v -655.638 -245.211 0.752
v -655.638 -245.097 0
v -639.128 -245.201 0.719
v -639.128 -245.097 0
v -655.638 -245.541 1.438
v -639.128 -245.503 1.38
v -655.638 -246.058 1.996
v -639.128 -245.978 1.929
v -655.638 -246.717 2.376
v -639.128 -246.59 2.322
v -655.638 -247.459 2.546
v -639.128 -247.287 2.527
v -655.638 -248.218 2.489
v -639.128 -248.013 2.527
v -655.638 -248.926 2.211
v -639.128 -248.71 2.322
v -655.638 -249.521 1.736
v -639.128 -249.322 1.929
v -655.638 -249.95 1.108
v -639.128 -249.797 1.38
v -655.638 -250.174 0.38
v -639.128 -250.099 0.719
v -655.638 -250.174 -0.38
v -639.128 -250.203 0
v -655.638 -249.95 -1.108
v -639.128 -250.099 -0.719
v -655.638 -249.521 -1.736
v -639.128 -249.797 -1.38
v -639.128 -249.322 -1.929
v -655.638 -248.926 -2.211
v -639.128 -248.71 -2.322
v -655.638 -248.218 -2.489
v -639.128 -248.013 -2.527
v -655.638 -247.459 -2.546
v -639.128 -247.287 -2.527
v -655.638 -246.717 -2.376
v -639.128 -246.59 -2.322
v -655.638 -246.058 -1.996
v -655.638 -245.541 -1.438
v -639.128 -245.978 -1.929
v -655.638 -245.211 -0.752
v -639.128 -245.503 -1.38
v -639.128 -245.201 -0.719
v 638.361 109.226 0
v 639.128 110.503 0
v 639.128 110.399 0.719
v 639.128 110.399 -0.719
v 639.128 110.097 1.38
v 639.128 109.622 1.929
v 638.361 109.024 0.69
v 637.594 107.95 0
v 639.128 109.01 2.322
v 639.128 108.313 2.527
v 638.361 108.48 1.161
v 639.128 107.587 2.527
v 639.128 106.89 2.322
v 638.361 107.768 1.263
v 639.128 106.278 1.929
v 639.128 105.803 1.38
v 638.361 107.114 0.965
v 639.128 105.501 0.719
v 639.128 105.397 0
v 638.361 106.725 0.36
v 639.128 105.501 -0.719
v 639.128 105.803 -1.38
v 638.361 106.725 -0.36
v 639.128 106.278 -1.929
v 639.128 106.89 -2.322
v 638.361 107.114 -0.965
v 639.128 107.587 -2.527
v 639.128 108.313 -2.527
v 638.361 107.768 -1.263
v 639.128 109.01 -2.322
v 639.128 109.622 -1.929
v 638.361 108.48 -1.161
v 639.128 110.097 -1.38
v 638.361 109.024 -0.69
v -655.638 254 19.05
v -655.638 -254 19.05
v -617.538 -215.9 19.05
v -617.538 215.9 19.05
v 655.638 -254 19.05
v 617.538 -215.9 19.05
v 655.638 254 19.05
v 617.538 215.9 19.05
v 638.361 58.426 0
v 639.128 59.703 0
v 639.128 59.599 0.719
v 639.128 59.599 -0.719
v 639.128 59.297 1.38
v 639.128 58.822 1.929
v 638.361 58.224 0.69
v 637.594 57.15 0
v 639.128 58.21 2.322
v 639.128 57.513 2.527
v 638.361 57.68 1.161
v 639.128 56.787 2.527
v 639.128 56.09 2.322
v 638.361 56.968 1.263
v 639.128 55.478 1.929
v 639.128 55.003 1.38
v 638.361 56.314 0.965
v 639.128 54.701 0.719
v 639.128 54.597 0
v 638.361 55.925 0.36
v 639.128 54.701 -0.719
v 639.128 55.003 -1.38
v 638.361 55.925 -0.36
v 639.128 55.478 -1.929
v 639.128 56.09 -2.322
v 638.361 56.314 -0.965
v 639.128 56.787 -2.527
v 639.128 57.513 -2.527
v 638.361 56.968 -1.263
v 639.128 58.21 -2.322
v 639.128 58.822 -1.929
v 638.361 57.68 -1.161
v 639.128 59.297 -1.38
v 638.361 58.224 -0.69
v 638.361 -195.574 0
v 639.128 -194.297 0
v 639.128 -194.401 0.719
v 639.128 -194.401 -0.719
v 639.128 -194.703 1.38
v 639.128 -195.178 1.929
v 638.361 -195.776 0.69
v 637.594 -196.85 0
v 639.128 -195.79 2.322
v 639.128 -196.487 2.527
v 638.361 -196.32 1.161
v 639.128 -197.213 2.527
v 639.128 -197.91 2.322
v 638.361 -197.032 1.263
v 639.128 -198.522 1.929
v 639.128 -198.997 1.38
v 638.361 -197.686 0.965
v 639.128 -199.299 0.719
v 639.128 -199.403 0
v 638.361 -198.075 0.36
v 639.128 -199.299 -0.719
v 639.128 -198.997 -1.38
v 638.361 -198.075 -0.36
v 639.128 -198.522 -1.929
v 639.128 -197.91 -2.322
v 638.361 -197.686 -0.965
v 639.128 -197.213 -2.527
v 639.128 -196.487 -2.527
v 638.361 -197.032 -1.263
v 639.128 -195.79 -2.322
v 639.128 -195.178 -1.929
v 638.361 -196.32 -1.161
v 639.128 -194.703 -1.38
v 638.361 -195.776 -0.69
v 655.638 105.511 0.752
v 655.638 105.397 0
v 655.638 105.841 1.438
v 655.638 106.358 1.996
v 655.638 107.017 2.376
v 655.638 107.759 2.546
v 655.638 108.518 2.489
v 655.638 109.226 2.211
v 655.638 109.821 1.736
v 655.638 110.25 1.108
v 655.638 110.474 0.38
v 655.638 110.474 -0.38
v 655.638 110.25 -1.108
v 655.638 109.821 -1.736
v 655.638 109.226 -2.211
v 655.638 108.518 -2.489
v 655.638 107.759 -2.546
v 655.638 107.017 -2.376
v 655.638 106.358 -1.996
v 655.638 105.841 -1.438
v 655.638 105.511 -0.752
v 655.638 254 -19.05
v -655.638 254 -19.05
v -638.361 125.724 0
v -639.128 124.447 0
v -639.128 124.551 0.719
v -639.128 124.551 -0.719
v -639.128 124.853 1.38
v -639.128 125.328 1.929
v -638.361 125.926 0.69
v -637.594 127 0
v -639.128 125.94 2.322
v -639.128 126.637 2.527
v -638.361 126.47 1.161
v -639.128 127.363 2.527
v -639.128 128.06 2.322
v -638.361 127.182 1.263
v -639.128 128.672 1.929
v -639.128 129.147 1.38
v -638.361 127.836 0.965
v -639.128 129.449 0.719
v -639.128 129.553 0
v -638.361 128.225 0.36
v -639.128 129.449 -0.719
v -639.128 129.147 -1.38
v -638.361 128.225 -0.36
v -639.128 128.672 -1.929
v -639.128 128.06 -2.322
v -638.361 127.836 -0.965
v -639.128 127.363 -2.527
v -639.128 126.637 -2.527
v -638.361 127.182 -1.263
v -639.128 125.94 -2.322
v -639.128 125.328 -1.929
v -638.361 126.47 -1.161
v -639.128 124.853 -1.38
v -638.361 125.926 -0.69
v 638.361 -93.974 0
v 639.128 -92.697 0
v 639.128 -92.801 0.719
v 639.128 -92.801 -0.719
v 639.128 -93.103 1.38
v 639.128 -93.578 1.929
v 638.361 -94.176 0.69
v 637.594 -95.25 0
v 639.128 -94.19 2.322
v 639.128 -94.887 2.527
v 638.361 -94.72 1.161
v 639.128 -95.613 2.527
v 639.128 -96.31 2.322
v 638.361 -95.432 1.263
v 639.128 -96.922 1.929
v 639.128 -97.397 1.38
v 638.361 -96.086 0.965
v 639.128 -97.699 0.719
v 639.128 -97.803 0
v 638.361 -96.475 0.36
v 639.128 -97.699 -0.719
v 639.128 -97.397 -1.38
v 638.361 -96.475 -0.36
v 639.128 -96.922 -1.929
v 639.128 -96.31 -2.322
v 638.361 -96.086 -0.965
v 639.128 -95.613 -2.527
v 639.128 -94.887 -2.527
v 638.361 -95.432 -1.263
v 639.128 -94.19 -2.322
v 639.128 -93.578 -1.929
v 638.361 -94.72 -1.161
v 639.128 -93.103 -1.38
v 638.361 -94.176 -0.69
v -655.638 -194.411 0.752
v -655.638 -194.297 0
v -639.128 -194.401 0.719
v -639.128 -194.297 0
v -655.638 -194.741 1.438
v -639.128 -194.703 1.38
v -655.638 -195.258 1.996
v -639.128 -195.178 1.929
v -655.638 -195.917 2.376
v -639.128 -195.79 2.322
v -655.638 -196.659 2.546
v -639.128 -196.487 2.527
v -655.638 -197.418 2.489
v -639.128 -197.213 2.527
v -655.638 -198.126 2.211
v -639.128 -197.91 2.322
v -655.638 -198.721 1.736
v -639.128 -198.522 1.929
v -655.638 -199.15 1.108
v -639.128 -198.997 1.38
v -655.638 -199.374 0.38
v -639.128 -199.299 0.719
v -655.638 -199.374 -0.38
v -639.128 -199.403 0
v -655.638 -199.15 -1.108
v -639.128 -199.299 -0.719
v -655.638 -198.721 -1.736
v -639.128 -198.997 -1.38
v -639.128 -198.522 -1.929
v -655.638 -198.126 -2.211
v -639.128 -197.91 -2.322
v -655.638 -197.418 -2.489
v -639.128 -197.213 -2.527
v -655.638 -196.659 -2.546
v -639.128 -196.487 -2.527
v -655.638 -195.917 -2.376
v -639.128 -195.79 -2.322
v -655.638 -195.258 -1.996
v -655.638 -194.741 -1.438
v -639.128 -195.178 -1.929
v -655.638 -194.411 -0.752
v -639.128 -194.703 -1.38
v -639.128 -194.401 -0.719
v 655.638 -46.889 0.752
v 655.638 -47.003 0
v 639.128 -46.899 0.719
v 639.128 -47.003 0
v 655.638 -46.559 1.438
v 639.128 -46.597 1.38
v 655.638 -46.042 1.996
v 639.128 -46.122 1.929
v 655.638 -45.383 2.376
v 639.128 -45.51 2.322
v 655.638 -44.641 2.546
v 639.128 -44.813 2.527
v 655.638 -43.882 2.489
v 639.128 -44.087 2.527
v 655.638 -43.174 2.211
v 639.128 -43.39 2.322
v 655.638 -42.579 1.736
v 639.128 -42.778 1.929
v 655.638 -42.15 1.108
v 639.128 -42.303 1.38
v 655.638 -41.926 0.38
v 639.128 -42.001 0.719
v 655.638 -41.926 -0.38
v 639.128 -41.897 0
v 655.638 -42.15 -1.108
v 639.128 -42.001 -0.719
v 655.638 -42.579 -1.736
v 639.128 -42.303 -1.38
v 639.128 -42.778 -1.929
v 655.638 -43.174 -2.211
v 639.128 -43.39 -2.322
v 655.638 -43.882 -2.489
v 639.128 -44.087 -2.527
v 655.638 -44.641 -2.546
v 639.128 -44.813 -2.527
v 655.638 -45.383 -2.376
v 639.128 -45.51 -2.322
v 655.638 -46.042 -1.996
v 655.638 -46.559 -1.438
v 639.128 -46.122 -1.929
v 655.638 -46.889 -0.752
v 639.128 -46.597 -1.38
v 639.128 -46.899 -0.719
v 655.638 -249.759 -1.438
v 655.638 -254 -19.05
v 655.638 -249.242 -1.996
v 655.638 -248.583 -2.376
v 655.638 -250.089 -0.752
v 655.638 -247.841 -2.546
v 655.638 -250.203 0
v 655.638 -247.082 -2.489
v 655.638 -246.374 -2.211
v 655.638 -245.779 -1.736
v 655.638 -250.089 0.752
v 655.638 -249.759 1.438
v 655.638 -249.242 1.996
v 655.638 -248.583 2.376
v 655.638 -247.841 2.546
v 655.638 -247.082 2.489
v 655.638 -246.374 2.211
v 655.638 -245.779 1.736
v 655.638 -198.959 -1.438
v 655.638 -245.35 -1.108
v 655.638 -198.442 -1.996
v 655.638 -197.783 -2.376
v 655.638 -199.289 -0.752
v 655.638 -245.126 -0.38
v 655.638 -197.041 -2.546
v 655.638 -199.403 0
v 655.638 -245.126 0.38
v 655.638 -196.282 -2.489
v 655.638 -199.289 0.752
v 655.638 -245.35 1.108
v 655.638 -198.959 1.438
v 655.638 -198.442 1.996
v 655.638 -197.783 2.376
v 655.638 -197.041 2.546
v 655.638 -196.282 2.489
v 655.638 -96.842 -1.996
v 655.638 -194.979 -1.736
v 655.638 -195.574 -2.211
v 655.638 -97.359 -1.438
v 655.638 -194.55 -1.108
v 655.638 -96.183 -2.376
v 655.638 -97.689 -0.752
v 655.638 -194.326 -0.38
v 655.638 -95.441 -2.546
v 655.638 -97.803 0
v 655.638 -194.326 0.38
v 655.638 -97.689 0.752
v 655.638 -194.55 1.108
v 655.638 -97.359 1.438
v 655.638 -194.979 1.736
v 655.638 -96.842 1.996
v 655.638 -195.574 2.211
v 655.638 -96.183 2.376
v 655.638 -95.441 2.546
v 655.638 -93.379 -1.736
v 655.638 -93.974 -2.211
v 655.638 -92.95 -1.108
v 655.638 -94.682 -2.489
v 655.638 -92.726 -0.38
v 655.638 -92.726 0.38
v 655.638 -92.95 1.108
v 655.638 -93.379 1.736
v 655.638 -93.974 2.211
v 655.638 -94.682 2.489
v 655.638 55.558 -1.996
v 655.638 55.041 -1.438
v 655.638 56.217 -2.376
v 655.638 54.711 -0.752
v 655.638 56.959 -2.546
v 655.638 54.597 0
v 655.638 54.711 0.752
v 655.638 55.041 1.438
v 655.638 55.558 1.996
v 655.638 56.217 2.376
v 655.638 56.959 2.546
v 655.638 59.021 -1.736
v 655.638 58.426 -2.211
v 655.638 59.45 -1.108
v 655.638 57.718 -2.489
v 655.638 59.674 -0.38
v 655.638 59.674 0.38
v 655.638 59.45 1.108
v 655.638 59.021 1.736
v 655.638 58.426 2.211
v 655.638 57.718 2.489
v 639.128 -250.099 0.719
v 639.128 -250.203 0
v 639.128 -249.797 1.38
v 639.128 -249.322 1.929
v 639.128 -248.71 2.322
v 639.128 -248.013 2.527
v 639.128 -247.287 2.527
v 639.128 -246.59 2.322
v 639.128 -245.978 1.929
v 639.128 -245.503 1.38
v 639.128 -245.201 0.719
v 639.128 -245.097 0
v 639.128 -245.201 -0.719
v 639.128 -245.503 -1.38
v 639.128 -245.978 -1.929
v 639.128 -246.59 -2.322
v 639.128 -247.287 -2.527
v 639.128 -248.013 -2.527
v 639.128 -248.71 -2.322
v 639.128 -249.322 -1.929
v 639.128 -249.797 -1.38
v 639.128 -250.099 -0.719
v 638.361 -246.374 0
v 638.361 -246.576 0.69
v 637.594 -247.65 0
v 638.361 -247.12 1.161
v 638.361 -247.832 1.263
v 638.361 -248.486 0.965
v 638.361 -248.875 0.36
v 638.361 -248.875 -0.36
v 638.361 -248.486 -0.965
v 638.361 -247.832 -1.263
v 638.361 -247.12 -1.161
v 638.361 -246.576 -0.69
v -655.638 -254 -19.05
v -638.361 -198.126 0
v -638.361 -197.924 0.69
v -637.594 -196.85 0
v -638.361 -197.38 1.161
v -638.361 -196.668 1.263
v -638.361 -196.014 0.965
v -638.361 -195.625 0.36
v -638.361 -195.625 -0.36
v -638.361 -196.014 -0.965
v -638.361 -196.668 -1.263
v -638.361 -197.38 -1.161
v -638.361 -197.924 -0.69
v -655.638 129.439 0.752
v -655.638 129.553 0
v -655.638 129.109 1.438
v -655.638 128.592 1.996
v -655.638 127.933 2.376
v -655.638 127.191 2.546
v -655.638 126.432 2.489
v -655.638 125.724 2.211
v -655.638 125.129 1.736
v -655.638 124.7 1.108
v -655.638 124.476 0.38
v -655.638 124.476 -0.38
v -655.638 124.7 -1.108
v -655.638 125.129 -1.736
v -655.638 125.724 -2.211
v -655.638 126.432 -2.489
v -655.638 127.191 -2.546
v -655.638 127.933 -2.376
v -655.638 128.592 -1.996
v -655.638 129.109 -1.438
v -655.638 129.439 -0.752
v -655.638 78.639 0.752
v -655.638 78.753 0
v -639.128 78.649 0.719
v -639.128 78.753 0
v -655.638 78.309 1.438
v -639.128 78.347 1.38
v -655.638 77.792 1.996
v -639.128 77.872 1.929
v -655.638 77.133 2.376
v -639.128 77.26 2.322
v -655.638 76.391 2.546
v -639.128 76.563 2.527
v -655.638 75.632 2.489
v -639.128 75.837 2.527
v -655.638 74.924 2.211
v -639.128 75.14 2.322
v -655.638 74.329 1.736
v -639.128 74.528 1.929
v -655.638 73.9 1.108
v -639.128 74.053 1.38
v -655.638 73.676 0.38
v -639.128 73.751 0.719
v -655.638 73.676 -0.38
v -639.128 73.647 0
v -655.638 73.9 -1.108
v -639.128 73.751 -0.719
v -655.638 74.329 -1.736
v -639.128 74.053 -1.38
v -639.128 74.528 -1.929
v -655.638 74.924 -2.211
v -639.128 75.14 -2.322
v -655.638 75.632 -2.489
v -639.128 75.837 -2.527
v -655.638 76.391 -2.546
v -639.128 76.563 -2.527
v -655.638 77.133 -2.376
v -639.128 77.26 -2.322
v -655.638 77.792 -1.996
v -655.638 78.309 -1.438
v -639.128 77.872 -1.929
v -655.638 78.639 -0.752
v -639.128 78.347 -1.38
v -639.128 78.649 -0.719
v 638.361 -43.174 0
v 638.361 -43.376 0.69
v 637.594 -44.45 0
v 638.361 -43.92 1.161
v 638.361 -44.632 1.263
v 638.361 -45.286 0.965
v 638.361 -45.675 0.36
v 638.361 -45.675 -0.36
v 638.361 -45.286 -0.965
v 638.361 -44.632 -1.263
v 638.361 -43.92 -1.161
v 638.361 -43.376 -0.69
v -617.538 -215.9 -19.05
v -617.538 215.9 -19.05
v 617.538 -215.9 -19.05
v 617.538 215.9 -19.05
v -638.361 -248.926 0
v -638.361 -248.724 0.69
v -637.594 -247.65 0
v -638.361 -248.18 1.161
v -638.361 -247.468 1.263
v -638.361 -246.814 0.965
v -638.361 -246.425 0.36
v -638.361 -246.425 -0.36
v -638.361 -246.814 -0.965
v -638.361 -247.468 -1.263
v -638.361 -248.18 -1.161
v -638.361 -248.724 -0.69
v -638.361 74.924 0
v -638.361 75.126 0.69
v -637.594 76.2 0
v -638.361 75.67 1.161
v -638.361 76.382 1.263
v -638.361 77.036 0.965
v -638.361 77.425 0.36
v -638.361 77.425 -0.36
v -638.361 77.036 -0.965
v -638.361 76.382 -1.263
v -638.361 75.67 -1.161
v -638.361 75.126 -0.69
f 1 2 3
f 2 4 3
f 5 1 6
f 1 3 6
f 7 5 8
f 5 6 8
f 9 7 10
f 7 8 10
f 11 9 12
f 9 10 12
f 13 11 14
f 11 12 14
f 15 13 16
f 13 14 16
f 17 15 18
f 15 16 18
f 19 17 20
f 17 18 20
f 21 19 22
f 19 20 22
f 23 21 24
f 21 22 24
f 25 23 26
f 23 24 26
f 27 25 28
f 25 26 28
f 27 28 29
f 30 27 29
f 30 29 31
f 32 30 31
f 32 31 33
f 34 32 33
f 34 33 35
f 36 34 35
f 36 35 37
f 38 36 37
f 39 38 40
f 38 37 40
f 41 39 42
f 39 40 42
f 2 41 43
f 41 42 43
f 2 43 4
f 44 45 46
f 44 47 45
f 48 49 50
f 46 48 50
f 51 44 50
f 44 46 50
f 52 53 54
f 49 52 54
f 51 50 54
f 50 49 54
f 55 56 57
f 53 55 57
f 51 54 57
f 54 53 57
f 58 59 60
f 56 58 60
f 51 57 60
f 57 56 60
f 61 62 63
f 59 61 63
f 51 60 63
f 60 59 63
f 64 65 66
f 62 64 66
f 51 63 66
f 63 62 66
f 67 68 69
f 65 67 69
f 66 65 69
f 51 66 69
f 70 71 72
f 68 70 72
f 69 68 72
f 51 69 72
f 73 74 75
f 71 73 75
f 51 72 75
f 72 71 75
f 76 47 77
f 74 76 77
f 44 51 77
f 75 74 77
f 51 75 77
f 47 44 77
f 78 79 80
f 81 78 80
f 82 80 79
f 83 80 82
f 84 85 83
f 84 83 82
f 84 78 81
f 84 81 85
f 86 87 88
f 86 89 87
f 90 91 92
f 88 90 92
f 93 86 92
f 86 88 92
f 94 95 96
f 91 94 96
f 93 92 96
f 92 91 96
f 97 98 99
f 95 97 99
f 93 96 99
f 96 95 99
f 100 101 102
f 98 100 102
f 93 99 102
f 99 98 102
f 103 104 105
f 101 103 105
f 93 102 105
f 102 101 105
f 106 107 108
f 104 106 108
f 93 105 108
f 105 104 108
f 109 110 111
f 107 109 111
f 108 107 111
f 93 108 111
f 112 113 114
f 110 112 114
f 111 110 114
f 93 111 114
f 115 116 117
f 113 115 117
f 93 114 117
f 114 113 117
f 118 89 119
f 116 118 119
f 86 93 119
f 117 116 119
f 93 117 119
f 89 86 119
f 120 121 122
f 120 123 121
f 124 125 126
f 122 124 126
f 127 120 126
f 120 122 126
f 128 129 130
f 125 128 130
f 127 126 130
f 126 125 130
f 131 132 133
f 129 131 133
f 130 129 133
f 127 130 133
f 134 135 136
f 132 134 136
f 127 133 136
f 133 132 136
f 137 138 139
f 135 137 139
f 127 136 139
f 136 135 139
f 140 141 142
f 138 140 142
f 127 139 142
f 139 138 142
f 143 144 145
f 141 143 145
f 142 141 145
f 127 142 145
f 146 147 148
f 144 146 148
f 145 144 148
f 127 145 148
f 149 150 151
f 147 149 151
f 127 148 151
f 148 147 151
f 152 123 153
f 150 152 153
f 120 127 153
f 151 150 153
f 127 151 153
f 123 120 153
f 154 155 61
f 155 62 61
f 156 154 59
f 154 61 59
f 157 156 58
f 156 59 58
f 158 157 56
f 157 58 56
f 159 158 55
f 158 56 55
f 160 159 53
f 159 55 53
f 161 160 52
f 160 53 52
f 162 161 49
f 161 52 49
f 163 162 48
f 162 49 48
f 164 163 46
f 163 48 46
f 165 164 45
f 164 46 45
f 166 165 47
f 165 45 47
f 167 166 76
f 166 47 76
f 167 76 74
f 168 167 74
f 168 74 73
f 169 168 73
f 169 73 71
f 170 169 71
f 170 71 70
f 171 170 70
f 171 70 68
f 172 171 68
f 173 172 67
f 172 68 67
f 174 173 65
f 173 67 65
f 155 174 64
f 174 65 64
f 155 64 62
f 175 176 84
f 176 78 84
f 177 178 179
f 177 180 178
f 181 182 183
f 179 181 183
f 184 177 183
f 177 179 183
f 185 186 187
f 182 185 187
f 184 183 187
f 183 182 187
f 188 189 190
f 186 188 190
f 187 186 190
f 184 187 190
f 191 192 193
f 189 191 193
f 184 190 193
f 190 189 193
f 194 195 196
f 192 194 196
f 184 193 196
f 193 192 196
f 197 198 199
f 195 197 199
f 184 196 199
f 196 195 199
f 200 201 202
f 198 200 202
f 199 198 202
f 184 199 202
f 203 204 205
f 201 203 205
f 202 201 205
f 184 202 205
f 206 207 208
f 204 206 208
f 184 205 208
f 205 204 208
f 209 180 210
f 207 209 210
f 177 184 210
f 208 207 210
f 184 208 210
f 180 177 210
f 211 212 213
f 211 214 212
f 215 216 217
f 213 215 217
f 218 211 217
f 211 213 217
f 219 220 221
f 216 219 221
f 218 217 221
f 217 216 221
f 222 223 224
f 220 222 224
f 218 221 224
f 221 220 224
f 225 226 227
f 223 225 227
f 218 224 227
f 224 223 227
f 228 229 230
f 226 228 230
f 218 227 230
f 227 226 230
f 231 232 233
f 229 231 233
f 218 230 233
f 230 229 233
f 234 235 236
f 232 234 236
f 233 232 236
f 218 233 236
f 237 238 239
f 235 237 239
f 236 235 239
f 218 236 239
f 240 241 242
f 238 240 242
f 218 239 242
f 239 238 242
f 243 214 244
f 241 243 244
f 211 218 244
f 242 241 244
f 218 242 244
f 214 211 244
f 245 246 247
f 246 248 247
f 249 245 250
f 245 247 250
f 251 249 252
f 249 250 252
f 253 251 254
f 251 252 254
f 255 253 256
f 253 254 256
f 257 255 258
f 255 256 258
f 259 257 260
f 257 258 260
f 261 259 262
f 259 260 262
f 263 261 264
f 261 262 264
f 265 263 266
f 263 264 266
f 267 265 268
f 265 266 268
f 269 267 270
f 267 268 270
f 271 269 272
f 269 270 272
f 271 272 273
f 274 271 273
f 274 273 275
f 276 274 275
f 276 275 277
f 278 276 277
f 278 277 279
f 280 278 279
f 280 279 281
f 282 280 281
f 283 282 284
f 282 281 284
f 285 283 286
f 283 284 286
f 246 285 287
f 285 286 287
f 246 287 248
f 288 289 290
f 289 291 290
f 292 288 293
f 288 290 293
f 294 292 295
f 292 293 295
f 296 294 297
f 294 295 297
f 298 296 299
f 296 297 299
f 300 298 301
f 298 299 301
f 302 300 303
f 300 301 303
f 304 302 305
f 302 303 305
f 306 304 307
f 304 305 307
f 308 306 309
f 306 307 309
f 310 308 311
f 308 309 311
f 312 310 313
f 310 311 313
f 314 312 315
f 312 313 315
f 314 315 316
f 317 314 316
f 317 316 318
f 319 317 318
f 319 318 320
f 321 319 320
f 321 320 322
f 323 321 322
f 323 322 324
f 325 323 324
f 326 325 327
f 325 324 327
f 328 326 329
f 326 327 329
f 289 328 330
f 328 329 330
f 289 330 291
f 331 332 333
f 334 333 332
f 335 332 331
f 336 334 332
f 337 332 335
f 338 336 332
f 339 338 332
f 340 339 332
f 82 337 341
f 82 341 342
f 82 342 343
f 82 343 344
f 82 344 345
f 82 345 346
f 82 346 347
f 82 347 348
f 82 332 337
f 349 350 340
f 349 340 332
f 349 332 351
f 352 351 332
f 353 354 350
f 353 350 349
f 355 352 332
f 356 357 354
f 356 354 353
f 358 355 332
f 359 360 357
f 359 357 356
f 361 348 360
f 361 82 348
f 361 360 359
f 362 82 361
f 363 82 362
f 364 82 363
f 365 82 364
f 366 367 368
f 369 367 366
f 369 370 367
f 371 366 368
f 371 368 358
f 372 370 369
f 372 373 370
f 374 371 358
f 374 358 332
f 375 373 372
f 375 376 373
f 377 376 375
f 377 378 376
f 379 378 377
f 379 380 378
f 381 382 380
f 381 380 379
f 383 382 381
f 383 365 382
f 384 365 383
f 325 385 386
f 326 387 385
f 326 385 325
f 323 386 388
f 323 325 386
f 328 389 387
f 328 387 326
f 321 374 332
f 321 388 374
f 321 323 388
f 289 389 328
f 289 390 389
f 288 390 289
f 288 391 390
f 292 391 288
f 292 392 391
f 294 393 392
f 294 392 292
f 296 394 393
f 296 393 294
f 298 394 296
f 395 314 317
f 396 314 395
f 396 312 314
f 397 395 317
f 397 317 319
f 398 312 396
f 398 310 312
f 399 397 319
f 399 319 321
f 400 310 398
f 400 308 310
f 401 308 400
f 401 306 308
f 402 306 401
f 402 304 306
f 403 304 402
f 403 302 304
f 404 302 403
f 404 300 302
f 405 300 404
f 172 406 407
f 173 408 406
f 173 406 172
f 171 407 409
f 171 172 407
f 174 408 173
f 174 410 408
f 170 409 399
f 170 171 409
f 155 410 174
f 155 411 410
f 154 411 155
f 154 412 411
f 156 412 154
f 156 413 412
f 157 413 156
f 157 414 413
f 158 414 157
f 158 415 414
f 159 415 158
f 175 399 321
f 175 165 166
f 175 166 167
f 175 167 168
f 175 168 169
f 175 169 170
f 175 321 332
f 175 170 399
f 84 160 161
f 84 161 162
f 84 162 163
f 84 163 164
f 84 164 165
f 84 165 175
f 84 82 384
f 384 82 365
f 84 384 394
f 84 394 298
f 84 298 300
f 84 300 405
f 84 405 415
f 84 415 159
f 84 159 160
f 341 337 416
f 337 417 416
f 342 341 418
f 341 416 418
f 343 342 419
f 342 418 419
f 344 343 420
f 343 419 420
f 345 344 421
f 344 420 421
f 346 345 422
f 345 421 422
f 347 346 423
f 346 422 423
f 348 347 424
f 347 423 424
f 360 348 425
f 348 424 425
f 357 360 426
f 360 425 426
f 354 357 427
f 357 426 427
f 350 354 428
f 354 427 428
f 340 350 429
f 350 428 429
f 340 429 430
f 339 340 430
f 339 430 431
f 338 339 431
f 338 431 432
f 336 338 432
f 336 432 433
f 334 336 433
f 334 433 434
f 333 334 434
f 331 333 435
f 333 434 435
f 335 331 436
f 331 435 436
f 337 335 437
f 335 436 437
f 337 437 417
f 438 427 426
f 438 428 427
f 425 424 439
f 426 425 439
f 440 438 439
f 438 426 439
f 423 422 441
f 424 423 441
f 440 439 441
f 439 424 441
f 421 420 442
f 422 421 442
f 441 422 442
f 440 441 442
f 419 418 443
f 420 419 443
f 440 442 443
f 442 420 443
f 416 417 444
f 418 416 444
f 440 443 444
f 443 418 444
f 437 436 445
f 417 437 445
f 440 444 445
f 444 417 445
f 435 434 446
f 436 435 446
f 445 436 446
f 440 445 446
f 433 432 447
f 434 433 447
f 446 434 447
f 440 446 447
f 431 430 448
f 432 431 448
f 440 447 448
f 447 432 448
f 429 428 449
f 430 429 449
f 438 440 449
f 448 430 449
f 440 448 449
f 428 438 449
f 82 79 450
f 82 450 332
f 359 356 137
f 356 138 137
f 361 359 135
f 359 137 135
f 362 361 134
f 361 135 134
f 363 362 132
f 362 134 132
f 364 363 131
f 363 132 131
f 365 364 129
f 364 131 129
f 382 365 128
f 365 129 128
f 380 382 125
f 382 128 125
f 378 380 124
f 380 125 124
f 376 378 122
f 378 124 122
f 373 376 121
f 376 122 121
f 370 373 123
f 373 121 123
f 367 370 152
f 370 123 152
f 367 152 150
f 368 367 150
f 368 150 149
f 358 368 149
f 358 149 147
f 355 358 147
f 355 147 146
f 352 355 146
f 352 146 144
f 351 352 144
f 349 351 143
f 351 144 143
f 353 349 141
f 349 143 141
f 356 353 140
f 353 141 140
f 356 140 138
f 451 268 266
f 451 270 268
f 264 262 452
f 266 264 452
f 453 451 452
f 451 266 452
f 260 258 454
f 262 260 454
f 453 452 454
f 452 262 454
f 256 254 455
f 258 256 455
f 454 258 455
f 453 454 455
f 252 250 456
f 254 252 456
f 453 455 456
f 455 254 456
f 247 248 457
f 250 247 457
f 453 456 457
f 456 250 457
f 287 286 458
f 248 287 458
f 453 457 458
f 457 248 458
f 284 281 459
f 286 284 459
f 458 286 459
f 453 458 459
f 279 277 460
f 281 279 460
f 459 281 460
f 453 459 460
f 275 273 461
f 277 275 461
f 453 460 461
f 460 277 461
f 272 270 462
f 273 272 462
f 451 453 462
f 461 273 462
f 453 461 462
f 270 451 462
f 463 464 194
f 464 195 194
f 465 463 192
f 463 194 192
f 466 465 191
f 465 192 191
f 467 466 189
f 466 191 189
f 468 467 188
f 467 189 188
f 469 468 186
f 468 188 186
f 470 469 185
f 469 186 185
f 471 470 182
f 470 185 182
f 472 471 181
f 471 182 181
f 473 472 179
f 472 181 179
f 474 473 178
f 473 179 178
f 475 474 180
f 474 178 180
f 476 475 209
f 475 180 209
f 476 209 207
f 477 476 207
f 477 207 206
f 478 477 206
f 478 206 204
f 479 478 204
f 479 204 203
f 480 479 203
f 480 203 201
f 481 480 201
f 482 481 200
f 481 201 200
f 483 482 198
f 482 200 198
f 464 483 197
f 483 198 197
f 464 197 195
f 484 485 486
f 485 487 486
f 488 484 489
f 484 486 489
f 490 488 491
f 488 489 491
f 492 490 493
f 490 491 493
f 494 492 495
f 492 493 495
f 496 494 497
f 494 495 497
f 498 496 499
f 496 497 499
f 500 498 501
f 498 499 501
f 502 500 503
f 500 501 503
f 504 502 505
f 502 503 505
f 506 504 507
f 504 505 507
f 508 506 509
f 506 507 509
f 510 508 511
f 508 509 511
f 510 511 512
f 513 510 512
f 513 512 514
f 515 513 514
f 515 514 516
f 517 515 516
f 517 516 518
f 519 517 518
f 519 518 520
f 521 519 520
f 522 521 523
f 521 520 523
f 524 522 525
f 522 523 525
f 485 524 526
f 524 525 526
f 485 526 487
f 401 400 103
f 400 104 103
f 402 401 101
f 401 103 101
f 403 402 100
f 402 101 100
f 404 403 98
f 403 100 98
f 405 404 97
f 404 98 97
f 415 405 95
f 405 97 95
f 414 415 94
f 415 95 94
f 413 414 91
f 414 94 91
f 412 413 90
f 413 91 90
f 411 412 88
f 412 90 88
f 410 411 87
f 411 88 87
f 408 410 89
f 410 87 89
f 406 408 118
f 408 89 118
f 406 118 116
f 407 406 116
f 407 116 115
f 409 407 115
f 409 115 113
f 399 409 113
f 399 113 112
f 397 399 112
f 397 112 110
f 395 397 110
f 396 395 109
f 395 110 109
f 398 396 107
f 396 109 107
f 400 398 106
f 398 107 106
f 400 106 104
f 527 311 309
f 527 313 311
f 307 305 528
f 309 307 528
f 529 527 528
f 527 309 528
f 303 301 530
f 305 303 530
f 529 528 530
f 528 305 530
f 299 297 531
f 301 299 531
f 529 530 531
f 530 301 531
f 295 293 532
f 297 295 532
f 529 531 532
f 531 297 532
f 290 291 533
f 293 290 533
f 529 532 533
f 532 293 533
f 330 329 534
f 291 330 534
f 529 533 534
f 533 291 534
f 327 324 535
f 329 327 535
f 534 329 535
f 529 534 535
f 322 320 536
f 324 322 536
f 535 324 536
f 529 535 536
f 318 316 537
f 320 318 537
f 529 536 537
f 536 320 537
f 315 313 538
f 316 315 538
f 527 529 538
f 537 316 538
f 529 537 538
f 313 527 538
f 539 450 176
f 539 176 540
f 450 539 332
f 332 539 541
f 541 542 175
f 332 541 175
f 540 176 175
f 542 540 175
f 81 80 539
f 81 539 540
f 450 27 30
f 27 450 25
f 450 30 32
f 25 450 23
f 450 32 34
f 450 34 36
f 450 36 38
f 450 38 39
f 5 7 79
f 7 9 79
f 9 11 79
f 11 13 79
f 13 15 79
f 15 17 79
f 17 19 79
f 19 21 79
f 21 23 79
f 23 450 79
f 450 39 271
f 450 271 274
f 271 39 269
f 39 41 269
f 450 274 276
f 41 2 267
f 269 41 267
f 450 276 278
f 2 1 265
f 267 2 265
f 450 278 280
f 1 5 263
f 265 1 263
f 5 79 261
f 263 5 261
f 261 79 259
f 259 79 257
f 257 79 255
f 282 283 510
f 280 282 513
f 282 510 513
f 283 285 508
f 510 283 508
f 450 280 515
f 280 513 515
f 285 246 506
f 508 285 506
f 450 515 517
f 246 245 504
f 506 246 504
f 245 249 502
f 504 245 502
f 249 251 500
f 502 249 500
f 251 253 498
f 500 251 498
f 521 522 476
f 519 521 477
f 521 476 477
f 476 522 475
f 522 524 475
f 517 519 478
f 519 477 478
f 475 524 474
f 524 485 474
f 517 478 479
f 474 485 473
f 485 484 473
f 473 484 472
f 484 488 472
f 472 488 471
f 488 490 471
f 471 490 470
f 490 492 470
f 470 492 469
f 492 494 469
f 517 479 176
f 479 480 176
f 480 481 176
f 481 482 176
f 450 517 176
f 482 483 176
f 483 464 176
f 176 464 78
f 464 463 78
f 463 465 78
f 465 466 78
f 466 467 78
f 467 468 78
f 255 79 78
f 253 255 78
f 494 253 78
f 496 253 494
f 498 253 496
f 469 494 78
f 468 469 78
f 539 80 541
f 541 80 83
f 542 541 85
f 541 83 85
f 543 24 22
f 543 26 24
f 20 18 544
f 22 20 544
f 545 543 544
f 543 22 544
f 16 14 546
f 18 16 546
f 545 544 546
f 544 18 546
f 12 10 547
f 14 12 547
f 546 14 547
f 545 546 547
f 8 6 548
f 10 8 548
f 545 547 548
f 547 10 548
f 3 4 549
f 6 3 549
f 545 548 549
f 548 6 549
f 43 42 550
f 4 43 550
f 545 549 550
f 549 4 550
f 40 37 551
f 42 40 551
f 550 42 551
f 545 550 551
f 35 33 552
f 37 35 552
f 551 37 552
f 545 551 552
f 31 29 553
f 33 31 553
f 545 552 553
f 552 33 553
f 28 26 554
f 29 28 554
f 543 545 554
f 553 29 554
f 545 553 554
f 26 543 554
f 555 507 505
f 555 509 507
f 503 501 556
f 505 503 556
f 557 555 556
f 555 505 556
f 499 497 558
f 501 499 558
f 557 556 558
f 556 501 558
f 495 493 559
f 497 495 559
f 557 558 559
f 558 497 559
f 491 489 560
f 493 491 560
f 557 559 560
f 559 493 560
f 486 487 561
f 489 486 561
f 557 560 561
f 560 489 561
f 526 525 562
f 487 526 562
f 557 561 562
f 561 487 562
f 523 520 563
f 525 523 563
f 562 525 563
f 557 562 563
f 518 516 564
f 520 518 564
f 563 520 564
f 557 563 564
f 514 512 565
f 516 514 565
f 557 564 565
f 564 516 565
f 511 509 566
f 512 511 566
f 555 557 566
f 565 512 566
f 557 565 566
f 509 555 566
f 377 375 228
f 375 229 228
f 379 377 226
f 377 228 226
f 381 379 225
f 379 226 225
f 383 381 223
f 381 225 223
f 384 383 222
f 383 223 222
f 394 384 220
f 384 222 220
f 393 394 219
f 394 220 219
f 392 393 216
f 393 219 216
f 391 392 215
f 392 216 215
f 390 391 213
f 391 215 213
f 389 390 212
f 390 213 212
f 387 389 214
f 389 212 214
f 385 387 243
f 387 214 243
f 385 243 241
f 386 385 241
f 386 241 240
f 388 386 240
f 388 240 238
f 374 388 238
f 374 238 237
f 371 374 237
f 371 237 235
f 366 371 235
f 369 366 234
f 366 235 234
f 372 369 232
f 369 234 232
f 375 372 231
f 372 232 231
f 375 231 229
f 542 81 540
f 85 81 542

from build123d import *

# Parameters (mm, degrees)
F0_W           = 1311.275
F0_H           = 508
F0_W_2         = 1235.075
F0_H_2         = 431.8
F1_DEPTH       = 19.05
F4_D           = 5.1054
F4_DEPTH       = 16.51
F4_TIP         = 1.5338169022
F4_ON_F3_D     = 5.1054
F4_ON_F3_DEPTH = 16.51
F4_ON_F3_TIP   = 1.5338169022


with BuildPart() as f1:
    # F0 (on Top) → F1 (new body, symmetric)
    with BuildSketch(Plane.XY):
        Rectangle(F0_W, F0_H)
        Rectangle(F0_W_2, F0_H_2, mode=Mode.SUBTRACT)
    extrude(amount=F1_DEPTH, both=True)

    # F4
    with Locations(Plane.YZ.offset(655.6375)):
        with Locations((57.15, 0), (107.95, 0), (-196.85, 0), (-247.65, 0), (-44.45, 0), (-95.25, 0)):
            Hole(F4_D / 2, depth=F4_DEPTH)
            with Locations((0, 0, -(F4_DEPTH + F4_TIP / 2))):  # 118° drill point
                Cone(0, F4_D / 2, F4_TIP, mode=Mode.SUBTRACT)

    # F4 on F3
    with Locations(Plane(origin=(-655.6375, 0, 0), x_dir=(0, -1, 0), z_dir=(-1, 0, 0))):
        with Locations((247.65, 0), (196.85, 0), (-76.2, 0), (-127, 0)):
            Hole(F4_ON_F3_D / 2, depth=F4_ON_F3_DEPTH)
            with Locations((0, 0, -(F4_ON_F3_DEPTH + F4_ON_F3_TIP / 2))):  # 118° drill point
                Cone(0, F4_ON_F3_D / 2, F4_ON_F3_TIP, mode=Mode.SUBTRACT)


solid = f1.part
